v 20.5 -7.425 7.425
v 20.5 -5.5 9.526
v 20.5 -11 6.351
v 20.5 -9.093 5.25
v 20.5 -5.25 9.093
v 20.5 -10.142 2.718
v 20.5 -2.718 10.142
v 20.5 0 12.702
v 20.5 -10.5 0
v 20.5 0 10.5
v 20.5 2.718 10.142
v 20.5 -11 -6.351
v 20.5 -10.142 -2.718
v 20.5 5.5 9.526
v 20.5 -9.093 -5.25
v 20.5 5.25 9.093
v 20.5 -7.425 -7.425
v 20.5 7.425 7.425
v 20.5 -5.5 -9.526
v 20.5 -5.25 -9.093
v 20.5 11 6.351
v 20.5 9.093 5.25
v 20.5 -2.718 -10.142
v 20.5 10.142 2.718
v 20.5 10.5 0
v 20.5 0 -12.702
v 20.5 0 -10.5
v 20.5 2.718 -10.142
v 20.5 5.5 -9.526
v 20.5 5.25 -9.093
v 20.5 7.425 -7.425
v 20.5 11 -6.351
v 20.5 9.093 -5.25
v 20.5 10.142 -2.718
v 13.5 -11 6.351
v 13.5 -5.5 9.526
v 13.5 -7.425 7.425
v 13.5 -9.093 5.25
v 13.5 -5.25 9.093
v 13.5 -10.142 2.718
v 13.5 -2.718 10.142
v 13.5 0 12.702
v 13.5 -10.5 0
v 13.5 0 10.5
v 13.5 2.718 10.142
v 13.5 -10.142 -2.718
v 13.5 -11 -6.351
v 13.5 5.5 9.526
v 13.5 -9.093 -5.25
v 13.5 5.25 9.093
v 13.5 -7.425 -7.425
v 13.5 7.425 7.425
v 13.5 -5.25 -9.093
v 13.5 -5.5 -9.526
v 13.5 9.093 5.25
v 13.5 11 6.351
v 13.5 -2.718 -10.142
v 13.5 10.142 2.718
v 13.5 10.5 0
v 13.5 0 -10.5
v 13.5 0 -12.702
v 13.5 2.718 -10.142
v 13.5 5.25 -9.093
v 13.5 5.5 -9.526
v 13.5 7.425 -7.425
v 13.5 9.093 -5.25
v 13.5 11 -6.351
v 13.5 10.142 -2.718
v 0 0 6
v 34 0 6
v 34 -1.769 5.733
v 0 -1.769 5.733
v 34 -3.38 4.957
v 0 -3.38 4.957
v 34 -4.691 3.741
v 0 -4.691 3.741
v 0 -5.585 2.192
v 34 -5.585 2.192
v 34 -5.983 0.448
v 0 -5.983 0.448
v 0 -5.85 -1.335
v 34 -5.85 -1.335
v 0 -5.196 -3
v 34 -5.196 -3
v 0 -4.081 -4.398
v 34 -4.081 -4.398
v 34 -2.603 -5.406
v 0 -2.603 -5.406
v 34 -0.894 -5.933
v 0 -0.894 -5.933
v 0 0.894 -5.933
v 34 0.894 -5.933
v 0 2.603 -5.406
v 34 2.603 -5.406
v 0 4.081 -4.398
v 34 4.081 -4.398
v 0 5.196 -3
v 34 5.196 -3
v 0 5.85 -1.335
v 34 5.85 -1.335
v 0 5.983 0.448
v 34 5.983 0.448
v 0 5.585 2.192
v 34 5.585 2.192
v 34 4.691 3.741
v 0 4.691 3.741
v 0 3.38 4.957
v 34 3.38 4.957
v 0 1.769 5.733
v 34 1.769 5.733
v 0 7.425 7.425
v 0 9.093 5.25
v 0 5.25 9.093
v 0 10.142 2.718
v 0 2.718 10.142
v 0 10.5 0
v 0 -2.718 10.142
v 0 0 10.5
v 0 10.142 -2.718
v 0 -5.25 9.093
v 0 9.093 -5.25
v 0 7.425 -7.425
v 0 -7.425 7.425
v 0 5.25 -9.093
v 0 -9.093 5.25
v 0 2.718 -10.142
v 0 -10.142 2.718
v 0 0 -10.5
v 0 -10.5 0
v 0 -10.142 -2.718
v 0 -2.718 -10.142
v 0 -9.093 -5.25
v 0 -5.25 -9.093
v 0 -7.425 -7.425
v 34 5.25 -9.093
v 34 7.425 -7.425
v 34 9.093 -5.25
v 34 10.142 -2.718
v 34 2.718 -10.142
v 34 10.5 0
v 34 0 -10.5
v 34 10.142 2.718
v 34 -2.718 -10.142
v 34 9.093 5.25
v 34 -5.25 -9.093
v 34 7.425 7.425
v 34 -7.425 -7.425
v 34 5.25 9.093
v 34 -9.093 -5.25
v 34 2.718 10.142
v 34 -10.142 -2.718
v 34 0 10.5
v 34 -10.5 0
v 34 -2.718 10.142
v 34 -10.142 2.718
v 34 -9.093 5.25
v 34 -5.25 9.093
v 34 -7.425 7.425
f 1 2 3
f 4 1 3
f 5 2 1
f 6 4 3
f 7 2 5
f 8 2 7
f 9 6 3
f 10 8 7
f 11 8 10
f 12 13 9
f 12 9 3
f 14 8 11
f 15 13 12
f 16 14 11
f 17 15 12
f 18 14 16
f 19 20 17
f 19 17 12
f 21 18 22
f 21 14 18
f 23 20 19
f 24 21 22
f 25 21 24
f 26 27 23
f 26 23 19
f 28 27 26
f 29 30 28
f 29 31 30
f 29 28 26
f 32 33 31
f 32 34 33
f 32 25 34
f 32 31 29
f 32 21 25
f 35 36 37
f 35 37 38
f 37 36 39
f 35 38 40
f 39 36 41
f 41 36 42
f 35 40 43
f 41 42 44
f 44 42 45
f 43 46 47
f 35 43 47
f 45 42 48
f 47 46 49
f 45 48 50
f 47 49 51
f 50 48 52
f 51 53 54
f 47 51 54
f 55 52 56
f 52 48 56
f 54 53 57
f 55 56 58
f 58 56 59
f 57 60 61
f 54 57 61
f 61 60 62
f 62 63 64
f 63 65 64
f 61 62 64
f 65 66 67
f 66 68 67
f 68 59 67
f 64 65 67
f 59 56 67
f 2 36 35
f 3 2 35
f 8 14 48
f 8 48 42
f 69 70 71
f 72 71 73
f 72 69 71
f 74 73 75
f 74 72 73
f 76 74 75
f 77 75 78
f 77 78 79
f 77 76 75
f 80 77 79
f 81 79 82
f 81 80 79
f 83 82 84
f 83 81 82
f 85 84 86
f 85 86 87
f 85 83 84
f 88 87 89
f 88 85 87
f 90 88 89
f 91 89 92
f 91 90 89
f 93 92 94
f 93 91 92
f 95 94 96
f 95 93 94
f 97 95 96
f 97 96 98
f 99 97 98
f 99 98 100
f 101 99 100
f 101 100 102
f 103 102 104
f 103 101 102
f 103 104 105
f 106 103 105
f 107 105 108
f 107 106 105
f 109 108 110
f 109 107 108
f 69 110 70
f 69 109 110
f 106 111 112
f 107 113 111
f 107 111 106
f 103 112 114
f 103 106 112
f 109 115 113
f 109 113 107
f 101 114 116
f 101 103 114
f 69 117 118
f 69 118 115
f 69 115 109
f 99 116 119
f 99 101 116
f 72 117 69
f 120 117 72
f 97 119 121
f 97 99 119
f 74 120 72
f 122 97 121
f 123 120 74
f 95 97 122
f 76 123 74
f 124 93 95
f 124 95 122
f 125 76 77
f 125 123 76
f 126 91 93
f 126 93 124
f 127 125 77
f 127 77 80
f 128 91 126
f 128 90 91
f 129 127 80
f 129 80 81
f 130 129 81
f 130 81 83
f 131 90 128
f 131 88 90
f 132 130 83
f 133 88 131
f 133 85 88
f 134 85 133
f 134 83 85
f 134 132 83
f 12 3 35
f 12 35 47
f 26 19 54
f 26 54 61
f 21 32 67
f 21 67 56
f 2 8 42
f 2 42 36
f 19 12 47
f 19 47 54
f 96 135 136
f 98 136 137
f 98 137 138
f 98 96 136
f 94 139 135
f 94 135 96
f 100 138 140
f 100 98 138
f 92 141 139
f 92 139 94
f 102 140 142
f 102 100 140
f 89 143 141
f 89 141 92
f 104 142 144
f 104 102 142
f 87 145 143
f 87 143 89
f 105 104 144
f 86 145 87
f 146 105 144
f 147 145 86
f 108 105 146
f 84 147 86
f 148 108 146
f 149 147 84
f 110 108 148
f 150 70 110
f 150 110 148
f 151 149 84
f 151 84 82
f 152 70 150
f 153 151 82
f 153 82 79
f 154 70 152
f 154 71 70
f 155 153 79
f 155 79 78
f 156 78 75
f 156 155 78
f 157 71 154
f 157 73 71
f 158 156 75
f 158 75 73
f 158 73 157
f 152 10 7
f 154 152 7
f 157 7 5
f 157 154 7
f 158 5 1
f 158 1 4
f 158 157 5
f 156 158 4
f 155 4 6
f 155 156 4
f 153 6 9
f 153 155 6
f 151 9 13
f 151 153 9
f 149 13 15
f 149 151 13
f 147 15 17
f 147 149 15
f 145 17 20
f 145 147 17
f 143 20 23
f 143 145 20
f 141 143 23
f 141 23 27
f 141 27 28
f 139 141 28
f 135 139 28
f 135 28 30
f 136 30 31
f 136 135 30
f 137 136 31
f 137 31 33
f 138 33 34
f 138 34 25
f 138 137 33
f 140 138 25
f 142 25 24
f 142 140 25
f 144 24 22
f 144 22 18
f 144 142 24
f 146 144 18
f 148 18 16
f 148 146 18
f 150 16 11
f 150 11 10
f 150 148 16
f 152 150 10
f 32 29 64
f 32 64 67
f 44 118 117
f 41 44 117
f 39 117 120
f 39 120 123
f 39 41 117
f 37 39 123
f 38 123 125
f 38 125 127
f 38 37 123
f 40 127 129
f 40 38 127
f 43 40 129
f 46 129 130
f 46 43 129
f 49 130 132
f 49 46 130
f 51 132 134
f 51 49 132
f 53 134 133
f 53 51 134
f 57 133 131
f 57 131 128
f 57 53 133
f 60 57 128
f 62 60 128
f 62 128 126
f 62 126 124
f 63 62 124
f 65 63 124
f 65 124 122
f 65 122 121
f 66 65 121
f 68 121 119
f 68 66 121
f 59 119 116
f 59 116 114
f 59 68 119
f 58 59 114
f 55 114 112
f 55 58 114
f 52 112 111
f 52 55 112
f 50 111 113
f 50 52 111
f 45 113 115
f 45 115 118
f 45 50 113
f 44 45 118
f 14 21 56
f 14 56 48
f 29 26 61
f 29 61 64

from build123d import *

# Parameters (mm, degrees)
ESTRUSIONE_ESTRUSIONE1_DEPTH = 7


with BuildPart() as part:
    # Schizzo1 → Rivoluzione1 (revolve)
    with BuildSketch(Plane.XY, mode=Mode.PRIVATE) as rivoluzione1_sk:
        Polygon((0, 6), (0, 10.5), (13.5, 10.5), (13.5, 11), (20.5, 11), (20.5, 10.5), (34, 10.5), (34, 6), align=None)
    revolve(rivoluzione1_sk.sketch.rotate(Axis((0, 0, 0), (1, 0, 0)), 90), axis=Axis((0, 0, 0), (1, 0, 0)))

    # Schizzo2 → Estrusione-Estrusione1 (add)
    with BuildSketch(Plane(origin=(20.5, 0, 0), x_dir=(0, 0, -1), z_dir=(1, 0, 0))):
        with BuildLine():
            Line((-9.526279218, 5.500000386), (-12.701705922, 0))
            Line((-12.701705922, 0), (-9.526279182, -5.50000045))
            ThreePointArc((-9.526279182, -5.50000045), (-11, -3.7e-08), (-9.526279218, 5.500000386))
        make_face()
        with BuildLine():
            Line((-6.350852961, 11), (-9.526279218, 5.500000386))
            ThreePointArc((-9.526279218, 5.500000386), (-5.499999807, 9.526279553), (0, 11))
            Line((0, 11), (-6.350852961, 11))
        make_face()
        with BuildLine():
            Line((6.350852961, 11), (0, 11))
            ThreePointArc((0, 11), (5.499999692, 9.526279619), (9.526279086, 5.500000616))
            Line((9.526279086, 5.500000616), (6.350852961, 11))
        make_face()
        with BuildLine():
            ThreePointArc((0, -11), (-5.499999775, -9.526279572), (-9.526279182, -5.50000045))
            Line((-9.526279182, -5.50000045), (-6.350852961, -11))
            Line((-6.350852961, -11), (0, -11))
        make_face()
        with BuildLine():
            ThreePointArc((9.526279182, -5.50000045), (5.499999775, -9.526279572), (0, -11))
            Line((0, -11), (6.350852961, -11))
            Line((6.350852961, -11), (9.526279182, -5.50000045))
        make_face()
        with BuildLine():
            ThreePointArc((11, 0), (10.625184022, -2.847009747), (9.526279182, -5.50000045))
            Line((9.526279182, -5.50000045), (12.701705922, 0))
            Line((12.701705922, 0), (9.526279086, 5.500000616))
            ThreePointArc((9.526279086, 5.500000616), (10.625183997, 2.84700984), (11, 0))
        make_face()
    extrude(amount=-ESTRUSIONE_ESTRUSIONE1_DEPTH)


solid = part.part
